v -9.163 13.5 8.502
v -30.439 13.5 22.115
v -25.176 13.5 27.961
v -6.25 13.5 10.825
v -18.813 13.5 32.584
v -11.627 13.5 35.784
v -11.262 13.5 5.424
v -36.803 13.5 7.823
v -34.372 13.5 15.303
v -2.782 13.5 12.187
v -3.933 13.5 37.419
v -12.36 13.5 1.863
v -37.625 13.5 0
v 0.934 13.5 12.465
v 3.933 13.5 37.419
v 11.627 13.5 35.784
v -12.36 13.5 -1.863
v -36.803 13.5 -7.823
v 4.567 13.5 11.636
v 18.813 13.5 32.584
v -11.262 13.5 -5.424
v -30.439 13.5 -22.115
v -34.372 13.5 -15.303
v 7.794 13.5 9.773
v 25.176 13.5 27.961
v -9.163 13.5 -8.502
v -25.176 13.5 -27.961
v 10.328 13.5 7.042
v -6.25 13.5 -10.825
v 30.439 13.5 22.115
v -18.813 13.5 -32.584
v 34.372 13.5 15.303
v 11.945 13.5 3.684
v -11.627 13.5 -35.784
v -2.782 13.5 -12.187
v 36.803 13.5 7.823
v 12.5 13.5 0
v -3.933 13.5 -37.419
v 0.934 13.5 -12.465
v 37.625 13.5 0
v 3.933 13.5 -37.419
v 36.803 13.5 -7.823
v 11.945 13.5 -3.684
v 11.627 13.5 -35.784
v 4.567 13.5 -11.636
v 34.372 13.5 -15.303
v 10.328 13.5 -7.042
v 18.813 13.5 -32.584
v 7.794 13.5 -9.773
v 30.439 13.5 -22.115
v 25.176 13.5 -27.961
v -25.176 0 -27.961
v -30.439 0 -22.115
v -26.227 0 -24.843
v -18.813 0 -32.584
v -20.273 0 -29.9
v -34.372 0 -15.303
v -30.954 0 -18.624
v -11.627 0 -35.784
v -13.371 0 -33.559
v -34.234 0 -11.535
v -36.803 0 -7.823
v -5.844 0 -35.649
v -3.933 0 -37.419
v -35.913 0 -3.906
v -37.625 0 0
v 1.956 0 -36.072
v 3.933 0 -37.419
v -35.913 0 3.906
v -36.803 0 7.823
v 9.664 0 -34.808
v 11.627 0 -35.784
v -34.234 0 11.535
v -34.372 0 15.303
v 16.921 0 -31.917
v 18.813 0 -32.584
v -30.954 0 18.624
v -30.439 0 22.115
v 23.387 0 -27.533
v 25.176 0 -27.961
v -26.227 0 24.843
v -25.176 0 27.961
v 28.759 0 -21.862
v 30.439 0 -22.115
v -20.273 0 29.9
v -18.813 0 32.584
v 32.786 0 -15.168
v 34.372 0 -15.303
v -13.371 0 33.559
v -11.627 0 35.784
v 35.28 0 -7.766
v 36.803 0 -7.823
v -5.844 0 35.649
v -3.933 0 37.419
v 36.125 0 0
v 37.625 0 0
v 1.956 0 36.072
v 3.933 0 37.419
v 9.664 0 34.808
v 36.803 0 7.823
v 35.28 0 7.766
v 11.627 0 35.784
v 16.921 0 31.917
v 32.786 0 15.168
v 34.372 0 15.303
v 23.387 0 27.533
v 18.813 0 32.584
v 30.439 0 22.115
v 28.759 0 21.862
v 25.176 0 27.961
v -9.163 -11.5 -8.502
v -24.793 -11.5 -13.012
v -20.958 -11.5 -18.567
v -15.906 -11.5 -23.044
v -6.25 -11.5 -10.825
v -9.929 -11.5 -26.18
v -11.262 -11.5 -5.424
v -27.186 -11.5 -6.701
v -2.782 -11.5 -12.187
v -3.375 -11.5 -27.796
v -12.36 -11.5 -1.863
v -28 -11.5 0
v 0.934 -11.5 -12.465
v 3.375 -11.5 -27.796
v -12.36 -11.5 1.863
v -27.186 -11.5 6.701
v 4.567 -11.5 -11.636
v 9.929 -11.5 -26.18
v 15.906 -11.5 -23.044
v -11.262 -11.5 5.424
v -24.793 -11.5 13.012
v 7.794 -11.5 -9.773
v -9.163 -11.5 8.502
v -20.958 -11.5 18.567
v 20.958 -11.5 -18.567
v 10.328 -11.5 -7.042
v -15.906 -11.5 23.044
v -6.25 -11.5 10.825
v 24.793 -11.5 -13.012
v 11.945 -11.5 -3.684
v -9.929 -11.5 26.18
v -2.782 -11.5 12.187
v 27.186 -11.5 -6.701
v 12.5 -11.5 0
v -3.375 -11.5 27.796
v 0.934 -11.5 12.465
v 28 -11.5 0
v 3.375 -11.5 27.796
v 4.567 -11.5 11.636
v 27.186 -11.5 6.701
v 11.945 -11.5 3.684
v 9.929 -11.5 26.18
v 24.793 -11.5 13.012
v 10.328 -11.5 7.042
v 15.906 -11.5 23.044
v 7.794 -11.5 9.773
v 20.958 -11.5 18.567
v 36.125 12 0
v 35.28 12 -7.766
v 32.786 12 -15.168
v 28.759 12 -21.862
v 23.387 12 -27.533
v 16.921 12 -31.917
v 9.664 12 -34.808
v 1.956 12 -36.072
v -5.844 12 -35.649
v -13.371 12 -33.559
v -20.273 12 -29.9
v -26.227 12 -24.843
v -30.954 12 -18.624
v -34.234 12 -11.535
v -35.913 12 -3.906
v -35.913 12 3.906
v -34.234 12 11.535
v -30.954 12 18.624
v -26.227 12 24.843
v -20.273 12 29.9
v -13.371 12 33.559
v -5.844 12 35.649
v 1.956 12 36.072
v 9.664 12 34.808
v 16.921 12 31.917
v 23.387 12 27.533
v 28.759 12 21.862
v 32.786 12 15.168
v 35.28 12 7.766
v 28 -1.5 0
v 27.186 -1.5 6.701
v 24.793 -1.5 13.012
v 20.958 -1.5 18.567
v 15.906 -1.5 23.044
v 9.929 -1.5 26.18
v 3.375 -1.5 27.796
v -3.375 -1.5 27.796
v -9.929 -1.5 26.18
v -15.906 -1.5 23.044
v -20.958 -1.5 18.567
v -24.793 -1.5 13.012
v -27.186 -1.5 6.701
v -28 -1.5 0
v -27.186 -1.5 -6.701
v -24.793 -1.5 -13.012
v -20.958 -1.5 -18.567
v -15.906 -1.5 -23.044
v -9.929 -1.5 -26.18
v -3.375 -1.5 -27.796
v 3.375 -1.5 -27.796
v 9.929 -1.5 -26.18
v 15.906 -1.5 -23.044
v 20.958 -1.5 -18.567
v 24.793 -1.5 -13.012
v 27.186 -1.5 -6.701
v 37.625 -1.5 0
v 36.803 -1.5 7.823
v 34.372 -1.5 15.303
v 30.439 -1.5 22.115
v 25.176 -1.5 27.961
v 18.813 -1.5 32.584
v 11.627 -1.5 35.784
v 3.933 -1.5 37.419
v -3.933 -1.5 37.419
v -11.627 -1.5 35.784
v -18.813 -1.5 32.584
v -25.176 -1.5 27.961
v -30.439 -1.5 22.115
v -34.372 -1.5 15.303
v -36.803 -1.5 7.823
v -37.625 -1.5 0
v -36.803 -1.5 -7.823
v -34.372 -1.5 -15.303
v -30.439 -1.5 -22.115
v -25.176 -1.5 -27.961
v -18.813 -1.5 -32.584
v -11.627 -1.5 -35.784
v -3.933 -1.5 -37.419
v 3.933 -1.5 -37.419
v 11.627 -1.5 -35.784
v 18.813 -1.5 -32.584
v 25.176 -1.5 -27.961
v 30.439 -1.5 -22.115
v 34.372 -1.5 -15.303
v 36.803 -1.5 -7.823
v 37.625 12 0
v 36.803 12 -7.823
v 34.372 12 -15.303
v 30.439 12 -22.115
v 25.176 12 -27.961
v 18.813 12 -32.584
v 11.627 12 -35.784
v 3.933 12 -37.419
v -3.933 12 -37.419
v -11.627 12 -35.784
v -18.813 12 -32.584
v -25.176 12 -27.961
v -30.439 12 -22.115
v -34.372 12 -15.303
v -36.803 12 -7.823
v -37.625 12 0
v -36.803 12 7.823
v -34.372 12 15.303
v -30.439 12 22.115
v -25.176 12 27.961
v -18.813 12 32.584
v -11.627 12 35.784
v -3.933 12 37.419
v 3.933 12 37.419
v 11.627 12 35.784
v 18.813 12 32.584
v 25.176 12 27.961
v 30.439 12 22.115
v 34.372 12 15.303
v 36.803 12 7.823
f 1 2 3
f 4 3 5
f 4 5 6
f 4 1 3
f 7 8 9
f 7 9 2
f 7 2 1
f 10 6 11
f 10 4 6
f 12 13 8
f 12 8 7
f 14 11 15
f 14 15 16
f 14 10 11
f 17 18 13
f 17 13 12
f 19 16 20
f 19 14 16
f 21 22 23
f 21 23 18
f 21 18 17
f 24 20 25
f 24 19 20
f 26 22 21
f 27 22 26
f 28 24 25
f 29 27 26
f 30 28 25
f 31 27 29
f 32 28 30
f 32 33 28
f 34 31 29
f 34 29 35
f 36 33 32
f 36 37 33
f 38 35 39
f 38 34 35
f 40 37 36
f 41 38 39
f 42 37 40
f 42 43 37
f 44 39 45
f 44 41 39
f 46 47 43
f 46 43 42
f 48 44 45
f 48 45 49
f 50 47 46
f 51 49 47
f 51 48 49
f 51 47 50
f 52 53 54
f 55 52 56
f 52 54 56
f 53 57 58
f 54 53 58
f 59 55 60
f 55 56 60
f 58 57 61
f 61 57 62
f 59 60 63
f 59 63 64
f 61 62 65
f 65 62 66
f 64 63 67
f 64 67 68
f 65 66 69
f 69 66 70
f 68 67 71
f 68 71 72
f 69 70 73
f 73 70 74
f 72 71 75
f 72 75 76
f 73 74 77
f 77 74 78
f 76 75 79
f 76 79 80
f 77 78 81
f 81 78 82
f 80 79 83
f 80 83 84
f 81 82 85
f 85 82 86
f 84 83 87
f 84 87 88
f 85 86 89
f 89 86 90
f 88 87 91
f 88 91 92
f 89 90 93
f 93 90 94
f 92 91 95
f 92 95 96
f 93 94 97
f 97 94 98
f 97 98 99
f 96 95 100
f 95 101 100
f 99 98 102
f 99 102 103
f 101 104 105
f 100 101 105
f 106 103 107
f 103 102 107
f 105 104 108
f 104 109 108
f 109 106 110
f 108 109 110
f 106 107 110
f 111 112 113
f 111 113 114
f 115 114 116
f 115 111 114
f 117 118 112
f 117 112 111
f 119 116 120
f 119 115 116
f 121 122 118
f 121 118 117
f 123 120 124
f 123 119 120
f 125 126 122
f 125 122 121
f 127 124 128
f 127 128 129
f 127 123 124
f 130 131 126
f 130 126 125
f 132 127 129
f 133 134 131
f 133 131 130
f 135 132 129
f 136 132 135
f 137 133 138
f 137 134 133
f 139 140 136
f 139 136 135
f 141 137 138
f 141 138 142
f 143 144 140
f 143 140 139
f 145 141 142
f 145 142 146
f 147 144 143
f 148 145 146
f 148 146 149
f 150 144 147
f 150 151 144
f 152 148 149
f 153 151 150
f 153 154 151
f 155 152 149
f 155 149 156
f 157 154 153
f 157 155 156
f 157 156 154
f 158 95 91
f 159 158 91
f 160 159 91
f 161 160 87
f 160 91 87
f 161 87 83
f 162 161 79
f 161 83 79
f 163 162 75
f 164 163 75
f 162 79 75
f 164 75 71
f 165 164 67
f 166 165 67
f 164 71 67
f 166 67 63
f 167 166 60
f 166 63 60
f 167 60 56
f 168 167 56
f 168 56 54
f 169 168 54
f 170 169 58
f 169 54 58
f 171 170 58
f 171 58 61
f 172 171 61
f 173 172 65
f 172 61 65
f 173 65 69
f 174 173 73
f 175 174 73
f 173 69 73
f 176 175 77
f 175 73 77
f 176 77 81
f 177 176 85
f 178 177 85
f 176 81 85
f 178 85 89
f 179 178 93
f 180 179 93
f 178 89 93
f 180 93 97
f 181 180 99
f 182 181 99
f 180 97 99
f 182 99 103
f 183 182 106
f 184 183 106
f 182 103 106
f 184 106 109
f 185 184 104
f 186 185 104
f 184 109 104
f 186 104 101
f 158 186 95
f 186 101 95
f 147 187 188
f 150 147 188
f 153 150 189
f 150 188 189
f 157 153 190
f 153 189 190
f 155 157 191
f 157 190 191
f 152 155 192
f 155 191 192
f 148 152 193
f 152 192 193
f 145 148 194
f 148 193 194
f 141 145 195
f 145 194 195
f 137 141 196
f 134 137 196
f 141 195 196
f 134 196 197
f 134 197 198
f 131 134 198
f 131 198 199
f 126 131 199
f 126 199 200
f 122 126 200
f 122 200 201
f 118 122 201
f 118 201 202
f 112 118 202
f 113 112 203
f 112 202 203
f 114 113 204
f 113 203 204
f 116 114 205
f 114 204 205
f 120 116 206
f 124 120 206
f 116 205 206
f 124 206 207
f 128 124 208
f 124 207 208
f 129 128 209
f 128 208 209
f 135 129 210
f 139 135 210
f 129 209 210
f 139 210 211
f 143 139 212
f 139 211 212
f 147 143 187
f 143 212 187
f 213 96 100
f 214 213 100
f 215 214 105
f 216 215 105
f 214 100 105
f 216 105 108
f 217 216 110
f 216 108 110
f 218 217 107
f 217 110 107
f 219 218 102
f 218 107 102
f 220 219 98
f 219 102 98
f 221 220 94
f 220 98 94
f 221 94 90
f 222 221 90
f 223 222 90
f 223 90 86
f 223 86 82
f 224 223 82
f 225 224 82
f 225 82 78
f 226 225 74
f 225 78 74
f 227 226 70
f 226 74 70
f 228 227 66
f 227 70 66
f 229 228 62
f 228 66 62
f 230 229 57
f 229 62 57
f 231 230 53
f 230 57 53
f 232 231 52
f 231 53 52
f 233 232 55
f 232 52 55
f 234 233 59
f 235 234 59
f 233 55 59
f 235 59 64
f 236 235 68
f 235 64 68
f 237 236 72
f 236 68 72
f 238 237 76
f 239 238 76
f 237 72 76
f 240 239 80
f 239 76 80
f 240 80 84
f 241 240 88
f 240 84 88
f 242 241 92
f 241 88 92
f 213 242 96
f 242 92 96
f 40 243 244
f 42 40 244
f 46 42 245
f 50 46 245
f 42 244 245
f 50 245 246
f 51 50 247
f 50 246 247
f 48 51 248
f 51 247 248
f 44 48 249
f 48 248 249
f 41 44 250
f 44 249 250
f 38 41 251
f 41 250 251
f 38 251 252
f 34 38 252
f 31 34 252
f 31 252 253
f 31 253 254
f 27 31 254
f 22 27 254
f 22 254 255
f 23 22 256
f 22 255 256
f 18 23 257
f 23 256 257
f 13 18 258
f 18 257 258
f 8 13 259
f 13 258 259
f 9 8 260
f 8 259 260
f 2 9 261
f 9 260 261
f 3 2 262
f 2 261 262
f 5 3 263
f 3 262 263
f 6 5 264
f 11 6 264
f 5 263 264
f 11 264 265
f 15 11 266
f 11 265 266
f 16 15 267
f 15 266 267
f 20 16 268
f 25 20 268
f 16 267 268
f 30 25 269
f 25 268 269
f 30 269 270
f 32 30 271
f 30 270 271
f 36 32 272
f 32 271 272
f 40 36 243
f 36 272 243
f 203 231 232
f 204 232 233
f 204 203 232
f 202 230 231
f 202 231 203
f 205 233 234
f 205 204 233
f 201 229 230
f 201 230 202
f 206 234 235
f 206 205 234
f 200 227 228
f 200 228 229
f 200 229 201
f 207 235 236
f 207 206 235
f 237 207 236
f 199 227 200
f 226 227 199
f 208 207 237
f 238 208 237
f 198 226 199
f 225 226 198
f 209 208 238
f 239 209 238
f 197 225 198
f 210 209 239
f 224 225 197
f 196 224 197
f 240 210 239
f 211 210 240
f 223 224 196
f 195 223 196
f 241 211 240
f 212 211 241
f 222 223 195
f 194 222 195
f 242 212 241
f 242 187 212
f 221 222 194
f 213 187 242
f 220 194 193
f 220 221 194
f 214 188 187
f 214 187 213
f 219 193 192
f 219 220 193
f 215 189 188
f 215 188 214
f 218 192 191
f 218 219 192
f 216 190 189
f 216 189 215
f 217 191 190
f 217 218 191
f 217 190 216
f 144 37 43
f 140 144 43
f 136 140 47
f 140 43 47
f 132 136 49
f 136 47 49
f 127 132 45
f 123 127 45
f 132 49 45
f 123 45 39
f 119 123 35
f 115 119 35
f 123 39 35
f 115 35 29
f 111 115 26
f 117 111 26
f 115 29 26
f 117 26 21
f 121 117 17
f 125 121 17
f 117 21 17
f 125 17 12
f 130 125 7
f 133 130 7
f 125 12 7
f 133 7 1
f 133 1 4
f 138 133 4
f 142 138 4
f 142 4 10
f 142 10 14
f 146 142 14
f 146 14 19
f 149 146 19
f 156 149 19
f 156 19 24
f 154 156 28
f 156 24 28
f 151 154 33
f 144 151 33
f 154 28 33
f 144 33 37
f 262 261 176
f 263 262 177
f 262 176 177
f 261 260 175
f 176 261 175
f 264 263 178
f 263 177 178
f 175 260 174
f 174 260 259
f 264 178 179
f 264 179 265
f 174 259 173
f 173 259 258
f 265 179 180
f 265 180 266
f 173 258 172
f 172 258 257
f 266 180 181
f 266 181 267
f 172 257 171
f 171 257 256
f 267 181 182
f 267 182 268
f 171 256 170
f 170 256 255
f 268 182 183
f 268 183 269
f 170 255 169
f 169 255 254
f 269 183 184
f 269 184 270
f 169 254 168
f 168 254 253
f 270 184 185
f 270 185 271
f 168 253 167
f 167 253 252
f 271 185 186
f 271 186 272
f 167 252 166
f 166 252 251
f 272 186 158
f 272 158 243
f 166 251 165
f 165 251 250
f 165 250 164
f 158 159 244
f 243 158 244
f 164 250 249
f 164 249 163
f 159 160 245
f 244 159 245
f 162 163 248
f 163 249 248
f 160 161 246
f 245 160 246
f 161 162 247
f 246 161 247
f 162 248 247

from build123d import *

# Parameters (mm, degrees)
SKETCH1_R           = 36.125
BOSS_EXTRUDE1_DEPTH = 12
SKETCH3_R           = 37.625
BOSS_EXTRUDE3_DEPTH = 1.5
SKETCH4_R           = 37.625
BOSS_EXTRUDE4_DEPTH = 1.5
SKETCH5_R           = 28
BOSS_EXTRUDE5_DEPTH = 10
SKETCH6_R           = 12.5
CUT_EXTRUDE1_DEPTH  = 25


with BuildPart() as part:
    # Sketch1 → Boss-Extrude1 (new body)
    with BuildSketch(Plane(origin=(0, 0, 0), x_dir=(1, 0, 0), z_dir=(0, 1, 0))):
        Circle(SKETCH1_R)
    extrude(amount=BOSS_EXTRUDE1_DEPTH)

    # Sketch3 → Boss-Extrude3 (add)
    with BuildSketch(Plane(origin=(0, 12, 0), x_dir=(1, 0, 0), z_dir=(0, 1, 0))):
        Circle(SKETCH3_R)
    extrude(amount=BOSS_EXTRUDE3_DEPTH)

    # Sketch4 → Boss-Extrude4 (add)
    with BuildSketch(Plane.XZ):
        Circle(SKETCH4_R)
    extrude(amount=BOSS_EXTRUDE4_DEPTH)

    # Sketch5 → Boss-Extrude5 (add)
    with BuildSketch(Plane.XZ.offset(1.5)):
        Circle(SKETCH5_R)
    extrude(amount=BOSS_EXTRUDE5_DEPTH)

    # Sketch6 → Cut-Extrude1 (cut)
    with BuildSketch(Plane(origin=(0, 13.5, 0), x_dir=(1, 0, 0), z_dir=(0, 1, 0))):
        Circle(SKETCH6_R)
    extrude(amount=-CUT_EXTRUDE1_DEPTH, mode=Mode.SUBTRACT)


solid = part.part
